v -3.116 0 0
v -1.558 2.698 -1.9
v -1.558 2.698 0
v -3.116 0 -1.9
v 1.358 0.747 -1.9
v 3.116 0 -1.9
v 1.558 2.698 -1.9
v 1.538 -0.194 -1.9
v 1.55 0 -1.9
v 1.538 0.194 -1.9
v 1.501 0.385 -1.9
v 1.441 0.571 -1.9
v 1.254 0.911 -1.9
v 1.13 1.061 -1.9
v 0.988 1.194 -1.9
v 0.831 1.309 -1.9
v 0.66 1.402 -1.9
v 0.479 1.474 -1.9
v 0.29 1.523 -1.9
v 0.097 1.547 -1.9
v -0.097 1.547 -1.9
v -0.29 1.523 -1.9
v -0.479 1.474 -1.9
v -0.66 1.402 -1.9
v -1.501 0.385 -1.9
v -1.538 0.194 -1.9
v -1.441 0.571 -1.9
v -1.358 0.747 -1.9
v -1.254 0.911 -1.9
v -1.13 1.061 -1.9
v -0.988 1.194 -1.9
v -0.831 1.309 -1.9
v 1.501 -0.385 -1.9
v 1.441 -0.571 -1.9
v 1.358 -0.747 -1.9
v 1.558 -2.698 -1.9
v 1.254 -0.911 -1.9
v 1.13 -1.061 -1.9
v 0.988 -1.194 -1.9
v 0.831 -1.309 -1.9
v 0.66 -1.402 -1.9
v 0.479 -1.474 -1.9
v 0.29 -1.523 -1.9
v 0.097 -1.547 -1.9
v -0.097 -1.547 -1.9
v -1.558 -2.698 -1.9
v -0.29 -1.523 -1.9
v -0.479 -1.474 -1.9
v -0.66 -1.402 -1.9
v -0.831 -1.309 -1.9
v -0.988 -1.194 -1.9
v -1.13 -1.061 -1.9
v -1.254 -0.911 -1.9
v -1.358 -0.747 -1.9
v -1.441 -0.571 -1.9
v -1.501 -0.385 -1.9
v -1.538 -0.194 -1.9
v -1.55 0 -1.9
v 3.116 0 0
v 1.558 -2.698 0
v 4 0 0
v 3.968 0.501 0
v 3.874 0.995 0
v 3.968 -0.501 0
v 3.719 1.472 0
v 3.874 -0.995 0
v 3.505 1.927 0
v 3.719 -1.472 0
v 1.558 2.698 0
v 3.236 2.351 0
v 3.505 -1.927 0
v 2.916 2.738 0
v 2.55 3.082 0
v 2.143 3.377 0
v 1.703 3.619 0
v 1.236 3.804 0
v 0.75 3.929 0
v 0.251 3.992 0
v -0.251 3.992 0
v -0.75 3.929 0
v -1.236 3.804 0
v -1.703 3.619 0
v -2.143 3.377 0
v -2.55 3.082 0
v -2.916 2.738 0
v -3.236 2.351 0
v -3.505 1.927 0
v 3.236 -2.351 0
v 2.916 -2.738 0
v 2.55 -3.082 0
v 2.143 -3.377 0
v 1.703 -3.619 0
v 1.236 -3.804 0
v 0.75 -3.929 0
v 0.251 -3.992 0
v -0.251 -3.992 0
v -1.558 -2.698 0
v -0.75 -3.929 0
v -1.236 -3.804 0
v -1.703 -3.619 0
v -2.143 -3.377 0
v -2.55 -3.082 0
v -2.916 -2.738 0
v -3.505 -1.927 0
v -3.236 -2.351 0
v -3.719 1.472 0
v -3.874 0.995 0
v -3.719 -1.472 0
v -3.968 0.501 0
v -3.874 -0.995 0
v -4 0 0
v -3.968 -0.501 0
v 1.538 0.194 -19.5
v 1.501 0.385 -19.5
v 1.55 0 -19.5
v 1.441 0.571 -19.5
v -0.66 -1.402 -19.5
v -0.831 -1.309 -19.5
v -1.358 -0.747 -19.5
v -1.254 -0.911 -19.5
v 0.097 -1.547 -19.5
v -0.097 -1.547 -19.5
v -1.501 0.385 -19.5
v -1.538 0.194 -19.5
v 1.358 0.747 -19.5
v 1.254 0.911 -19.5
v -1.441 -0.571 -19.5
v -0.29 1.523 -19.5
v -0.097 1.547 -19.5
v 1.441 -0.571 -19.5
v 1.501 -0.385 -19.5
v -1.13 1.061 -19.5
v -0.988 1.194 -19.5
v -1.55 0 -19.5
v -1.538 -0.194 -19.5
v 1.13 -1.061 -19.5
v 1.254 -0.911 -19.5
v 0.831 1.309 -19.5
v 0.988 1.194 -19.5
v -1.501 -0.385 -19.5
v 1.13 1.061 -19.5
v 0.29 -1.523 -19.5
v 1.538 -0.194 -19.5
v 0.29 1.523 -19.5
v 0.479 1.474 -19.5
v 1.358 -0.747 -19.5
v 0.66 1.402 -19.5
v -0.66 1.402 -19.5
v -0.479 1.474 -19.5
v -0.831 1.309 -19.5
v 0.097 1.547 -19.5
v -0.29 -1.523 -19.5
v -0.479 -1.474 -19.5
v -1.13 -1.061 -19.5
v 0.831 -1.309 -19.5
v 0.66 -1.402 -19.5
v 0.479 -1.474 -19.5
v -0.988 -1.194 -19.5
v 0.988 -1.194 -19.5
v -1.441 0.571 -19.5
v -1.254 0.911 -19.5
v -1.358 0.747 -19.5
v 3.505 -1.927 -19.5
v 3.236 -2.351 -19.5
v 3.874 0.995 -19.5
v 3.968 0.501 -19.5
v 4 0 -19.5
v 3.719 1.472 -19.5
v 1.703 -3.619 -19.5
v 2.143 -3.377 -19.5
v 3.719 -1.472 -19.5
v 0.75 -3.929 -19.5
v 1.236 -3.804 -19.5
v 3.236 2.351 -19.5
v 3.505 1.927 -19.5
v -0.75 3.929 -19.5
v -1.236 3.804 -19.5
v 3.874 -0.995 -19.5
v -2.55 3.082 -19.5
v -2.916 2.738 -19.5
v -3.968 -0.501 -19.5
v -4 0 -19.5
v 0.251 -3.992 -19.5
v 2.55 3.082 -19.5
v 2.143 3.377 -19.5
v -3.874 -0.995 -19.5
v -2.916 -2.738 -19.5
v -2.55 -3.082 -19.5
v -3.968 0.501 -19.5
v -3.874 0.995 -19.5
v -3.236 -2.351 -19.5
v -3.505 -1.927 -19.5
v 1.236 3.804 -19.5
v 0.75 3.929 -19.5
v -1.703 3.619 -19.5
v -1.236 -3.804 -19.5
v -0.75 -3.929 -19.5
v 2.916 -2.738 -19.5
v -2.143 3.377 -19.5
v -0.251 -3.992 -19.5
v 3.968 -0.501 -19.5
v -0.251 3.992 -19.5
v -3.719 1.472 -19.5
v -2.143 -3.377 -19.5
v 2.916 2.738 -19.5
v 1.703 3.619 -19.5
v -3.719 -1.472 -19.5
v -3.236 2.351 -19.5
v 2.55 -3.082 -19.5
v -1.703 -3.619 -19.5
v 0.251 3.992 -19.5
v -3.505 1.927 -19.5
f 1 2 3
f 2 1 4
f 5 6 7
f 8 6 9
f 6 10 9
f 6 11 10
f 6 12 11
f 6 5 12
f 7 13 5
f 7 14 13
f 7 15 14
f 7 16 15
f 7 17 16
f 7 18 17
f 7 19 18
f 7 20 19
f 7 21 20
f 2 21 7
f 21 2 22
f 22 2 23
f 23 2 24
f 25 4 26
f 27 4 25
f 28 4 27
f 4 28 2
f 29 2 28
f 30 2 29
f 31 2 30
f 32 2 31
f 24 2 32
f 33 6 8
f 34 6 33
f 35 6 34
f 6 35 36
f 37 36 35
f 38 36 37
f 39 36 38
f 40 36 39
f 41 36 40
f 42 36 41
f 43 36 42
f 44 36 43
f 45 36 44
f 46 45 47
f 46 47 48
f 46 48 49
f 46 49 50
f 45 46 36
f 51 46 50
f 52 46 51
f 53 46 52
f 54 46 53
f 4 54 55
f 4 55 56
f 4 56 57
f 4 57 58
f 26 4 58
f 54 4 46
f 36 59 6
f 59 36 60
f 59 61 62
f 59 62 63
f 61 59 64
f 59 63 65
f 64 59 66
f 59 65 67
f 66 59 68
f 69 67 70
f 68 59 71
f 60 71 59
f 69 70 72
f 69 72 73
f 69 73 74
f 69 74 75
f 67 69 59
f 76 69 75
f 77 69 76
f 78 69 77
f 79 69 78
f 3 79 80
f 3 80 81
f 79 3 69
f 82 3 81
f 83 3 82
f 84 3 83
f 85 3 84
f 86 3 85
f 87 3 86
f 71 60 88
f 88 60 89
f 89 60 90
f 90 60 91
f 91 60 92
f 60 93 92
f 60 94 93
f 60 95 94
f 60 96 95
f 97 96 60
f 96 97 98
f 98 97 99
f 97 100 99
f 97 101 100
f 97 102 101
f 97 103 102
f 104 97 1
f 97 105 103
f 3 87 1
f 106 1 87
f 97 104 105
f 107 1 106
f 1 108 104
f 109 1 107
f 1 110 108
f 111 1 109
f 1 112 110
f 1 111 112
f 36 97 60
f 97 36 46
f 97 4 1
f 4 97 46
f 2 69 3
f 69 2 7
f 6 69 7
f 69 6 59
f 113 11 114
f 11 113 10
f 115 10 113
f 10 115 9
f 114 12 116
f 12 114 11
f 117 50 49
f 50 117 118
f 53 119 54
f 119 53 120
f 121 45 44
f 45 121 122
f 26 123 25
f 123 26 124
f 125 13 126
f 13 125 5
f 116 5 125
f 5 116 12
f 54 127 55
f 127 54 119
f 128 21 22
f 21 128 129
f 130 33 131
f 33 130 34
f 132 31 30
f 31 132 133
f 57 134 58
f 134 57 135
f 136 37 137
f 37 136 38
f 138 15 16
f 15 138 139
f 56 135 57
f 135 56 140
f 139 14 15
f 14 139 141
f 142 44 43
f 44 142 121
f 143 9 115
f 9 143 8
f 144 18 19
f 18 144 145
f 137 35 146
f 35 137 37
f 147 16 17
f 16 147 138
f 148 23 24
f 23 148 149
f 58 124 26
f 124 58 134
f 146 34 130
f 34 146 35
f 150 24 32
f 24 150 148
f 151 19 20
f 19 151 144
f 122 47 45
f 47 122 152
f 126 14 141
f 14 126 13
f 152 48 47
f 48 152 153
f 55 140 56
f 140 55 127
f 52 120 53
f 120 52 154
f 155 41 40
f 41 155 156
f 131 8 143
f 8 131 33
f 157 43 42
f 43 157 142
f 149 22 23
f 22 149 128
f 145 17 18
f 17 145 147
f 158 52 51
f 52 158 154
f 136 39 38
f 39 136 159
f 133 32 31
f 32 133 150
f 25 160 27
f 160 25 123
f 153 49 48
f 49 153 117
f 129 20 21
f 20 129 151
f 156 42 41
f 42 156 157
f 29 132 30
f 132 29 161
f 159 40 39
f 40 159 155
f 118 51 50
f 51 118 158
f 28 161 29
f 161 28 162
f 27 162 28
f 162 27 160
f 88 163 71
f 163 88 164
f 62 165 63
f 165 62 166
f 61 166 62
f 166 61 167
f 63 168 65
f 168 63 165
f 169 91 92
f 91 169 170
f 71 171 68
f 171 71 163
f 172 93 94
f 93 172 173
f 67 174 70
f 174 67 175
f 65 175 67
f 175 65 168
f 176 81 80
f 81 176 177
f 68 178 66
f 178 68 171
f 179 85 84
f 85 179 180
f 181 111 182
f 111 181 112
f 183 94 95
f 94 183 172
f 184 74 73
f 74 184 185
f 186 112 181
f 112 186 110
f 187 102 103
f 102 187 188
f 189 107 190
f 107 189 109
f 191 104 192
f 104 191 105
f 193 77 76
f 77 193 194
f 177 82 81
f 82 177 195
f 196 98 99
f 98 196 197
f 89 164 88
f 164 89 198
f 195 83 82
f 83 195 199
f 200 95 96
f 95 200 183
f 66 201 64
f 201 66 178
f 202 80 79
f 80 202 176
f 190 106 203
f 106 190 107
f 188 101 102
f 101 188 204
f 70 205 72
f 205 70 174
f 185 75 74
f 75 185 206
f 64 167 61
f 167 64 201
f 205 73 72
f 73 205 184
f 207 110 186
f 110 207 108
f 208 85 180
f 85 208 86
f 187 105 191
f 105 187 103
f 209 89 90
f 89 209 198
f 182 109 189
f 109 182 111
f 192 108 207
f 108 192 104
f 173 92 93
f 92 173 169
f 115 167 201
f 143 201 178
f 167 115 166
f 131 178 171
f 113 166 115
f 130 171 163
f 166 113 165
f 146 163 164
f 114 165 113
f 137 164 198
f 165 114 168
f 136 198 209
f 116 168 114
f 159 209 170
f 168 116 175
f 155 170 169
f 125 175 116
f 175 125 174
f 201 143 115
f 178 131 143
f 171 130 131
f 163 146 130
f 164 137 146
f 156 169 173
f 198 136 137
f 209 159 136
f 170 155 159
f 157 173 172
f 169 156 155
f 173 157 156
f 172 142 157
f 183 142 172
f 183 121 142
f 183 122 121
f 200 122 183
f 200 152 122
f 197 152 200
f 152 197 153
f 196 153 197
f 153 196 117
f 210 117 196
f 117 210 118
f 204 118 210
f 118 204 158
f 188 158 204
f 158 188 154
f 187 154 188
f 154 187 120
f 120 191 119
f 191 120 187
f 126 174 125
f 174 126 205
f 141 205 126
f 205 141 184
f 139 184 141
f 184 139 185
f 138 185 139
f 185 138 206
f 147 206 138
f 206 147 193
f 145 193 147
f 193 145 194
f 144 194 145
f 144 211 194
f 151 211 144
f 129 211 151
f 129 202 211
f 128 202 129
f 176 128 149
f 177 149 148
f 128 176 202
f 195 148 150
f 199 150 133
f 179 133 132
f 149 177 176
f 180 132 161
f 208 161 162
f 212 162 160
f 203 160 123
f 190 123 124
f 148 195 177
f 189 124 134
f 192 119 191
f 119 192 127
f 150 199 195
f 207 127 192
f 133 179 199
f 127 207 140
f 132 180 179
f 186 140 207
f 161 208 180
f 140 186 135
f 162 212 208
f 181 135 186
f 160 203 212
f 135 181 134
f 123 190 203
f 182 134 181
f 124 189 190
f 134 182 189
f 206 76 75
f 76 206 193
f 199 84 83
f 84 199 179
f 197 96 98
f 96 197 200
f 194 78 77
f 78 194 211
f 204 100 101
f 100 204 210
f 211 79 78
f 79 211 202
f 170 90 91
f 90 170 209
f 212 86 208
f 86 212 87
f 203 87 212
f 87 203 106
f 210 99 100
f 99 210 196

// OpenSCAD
$fn = 50;

difference() {
	union() {
		translate(v = [0, 0, -19.5]) {
			cylinder(h = 19.5, r = 4.0);
		}
	}
	union() {
		translate(v = [0, 0, 0]) {
			rotate(a = [0, 0, 0]) {
				difference() {
					union() {
						translate(v = [0, 0, -1.9]) {
							linear_extrude(height = 1.9) {
								polygon(points = [[3.1158, 0.0], [1.5579000000000005, 2.698361953111554], [-1.5578999999999994, 2.6983619531115544], [-3.1158, 3.815754496783323e-16], [-1.5579000000000014, -2.6983619531115535], [1.557899999999998, -2.6983619531115552]]);
							}
						}
					}
					union();
				}
			}
		}
		#translate(v = [0, 0, -100.0]) {
			cylinder(h = 200, r = 1.55);
		}
	}
}
